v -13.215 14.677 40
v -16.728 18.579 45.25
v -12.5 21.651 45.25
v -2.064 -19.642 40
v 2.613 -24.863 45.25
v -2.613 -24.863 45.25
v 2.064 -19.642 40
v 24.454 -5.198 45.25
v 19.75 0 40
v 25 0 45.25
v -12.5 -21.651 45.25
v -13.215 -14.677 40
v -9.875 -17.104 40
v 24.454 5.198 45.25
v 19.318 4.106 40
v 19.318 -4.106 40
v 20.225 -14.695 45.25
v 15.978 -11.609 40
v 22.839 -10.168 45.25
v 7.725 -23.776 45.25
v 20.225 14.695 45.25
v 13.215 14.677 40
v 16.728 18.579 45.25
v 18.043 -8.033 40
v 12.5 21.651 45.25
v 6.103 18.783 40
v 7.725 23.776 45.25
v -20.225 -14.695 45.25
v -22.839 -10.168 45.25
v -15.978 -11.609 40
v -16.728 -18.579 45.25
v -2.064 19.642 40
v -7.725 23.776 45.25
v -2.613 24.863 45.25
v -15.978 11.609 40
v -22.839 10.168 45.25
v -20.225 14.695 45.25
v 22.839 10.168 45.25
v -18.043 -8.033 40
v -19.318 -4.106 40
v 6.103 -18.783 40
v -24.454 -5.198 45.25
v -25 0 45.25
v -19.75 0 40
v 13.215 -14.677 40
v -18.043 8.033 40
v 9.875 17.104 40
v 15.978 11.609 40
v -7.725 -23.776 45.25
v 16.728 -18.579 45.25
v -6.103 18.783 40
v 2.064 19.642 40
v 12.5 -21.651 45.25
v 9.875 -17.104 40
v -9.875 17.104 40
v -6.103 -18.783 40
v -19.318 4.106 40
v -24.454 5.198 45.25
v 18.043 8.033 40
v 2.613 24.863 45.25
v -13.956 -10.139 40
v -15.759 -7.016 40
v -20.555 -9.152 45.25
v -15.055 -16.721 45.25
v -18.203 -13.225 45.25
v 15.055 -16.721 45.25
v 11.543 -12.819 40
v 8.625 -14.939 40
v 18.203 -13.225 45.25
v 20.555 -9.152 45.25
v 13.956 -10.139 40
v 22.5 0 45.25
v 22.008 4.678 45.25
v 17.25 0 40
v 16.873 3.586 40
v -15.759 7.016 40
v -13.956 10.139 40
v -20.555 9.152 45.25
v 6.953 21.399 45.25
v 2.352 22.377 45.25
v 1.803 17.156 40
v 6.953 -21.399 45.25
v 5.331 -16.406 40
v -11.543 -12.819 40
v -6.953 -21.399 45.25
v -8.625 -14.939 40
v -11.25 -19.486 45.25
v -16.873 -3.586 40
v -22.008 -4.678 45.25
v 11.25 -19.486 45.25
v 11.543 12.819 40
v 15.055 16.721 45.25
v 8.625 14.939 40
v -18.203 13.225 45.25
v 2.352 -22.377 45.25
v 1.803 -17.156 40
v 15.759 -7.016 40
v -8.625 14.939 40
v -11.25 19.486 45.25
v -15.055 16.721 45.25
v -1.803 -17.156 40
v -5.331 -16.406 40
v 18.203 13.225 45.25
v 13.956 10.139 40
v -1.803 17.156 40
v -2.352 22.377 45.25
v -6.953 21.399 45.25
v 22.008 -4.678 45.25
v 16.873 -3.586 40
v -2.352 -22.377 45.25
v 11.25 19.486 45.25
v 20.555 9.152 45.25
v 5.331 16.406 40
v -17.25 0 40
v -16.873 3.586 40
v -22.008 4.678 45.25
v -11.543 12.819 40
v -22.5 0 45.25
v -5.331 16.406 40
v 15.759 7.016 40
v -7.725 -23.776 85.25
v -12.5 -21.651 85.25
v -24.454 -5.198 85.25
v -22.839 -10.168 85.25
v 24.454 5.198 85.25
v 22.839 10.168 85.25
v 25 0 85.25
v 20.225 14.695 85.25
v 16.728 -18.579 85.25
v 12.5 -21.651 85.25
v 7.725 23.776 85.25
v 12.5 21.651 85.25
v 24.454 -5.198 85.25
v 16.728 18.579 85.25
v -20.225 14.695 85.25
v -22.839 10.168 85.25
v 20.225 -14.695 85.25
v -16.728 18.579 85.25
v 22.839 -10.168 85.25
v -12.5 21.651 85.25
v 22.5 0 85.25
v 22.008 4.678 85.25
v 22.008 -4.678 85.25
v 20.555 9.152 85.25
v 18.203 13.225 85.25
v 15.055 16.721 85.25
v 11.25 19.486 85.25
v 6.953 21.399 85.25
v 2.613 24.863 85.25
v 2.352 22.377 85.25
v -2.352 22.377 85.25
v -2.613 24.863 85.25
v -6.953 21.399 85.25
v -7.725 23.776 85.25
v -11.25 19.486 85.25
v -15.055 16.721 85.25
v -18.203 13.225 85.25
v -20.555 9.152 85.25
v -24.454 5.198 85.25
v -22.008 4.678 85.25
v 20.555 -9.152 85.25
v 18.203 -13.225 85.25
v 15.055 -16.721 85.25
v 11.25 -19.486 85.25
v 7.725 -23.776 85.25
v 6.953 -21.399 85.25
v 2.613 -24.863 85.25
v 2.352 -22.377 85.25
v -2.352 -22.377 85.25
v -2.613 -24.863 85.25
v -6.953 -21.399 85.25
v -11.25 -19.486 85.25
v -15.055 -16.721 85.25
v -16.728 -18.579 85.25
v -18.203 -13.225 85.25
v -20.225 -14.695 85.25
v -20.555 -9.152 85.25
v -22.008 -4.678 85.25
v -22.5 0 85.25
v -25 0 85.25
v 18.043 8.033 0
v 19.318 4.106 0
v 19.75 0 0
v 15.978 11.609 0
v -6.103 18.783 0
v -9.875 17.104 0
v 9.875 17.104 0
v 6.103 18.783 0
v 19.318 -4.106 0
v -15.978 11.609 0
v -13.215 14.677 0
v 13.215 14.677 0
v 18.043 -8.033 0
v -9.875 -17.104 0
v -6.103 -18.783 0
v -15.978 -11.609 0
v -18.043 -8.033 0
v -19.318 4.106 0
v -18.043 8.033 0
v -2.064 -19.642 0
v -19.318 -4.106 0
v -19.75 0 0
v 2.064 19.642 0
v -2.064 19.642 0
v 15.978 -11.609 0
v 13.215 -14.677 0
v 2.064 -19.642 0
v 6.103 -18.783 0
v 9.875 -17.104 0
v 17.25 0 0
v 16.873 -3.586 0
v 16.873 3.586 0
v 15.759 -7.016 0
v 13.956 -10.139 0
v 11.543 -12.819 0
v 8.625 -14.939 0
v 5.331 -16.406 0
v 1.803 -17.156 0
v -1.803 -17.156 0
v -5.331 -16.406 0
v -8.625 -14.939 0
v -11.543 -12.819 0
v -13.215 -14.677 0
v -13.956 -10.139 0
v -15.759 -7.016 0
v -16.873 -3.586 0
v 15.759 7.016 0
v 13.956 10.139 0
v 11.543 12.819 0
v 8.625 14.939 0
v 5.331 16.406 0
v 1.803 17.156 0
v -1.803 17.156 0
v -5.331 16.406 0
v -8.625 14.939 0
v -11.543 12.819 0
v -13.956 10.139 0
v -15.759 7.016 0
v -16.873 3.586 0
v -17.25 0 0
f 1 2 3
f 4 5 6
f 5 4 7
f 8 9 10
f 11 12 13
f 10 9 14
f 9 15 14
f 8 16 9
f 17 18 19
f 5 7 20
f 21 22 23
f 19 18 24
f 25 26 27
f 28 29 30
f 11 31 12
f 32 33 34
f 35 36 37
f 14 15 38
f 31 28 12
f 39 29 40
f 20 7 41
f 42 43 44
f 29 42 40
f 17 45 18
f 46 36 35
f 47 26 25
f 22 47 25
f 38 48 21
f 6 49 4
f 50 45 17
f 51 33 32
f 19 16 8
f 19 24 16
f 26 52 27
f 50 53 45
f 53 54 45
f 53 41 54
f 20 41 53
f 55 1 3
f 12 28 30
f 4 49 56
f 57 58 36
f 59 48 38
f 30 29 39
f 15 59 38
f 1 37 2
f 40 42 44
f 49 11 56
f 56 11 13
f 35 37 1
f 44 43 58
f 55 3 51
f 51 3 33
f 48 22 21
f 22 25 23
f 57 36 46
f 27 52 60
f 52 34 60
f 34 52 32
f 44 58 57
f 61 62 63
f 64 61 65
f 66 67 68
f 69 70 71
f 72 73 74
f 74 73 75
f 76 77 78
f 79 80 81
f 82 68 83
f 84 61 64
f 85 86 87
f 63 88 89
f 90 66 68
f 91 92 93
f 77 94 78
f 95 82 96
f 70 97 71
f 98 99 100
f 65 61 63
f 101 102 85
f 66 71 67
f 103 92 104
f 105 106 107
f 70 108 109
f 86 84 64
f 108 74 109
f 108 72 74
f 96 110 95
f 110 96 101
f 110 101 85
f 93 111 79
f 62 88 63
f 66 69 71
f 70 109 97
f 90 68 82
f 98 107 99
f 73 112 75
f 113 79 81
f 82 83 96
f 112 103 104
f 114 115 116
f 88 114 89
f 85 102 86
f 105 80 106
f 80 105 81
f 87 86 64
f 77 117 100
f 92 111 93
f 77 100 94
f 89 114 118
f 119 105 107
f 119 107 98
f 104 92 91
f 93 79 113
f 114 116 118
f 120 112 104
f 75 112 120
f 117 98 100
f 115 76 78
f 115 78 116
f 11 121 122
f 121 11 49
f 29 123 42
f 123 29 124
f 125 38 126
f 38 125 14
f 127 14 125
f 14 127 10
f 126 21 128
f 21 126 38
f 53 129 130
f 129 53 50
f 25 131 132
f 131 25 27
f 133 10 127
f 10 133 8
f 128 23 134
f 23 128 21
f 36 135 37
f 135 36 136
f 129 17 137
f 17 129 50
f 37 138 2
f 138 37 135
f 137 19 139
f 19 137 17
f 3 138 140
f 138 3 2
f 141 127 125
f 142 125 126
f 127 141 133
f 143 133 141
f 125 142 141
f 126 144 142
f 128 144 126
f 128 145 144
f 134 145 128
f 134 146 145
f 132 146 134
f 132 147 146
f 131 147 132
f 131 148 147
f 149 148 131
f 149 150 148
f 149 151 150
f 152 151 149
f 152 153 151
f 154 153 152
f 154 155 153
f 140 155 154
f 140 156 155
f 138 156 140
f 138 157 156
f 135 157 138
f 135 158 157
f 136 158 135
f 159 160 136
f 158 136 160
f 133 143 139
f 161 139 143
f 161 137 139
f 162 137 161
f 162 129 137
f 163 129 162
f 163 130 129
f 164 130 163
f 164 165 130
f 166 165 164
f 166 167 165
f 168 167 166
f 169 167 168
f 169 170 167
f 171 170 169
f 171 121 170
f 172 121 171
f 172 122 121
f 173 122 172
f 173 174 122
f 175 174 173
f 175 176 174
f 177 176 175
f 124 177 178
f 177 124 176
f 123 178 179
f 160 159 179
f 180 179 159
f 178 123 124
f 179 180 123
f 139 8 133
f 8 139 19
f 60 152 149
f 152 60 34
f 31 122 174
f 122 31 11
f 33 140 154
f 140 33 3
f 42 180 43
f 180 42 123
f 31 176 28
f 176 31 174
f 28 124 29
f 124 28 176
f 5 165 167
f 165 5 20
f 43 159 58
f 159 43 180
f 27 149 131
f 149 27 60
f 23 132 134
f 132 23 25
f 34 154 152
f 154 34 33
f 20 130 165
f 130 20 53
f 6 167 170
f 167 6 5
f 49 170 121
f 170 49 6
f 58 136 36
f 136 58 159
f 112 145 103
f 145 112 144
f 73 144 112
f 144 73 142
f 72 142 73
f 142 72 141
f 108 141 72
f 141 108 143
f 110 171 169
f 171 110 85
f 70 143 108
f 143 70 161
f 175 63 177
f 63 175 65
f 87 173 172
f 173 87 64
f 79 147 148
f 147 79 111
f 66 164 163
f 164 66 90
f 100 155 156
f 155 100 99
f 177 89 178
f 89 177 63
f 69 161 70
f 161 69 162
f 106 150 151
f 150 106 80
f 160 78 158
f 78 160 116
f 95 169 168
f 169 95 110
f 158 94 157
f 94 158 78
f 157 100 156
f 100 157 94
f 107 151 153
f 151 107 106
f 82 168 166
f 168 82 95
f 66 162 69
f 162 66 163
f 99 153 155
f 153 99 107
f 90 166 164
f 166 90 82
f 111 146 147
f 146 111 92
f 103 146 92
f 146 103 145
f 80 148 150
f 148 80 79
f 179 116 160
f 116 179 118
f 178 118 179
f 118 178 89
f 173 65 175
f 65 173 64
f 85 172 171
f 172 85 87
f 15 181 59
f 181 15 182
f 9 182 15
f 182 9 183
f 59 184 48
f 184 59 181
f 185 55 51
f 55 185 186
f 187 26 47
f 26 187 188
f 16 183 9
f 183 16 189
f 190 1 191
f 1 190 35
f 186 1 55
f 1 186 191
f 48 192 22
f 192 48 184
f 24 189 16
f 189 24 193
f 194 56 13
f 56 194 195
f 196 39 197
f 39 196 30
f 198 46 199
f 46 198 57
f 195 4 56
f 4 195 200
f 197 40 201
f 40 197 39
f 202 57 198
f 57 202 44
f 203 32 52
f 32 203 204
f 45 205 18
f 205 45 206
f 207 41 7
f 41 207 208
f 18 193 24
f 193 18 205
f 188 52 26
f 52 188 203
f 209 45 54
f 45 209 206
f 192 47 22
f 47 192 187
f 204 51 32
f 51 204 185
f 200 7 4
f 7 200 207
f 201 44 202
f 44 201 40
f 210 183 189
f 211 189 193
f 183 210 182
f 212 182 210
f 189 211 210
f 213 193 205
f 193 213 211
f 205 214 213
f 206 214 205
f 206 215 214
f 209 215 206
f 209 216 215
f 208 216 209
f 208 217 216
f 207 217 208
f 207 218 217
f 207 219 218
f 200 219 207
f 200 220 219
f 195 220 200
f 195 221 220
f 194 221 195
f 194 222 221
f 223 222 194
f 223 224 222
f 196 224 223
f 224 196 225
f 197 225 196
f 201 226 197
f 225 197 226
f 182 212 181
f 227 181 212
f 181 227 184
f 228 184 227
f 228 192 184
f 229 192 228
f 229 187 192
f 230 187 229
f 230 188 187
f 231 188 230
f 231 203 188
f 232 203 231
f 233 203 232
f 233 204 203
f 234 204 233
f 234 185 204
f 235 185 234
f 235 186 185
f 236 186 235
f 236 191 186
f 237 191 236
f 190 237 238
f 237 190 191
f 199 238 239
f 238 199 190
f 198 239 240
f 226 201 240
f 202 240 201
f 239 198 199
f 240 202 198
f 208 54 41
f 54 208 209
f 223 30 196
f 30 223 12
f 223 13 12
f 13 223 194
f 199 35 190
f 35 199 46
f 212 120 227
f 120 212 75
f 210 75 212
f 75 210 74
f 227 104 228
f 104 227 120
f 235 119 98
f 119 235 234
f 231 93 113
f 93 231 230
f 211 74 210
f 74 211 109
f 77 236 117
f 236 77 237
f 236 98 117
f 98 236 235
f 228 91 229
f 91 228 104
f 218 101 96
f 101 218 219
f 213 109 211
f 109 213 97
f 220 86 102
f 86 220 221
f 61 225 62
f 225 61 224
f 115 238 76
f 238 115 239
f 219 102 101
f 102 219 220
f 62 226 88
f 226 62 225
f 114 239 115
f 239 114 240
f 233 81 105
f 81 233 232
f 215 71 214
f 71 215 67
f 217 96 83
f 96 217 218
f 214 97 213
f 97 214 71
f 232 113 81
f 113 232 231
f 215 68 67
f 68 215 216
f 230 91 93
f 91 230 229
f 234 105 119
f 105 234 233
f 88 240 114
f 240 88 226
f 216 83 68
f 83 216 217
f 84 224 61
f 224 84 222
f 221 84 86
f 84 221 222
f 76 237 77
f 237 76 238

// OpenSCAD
// my first parametric OpenSCAD project, making couplers
// for a dust collection vacuum hose
// set the inlet and outlet diameters, use 45 degree slope
// to provide easy no-supports printing
inlet_outer_dia = 50;
inlet_inner_dia = 45;
inlet_length = 40;
outlet_outer_dia = 39.5;
outlet_inner_dia = 34.5;
outlet_length = 40;
max_slope_angle_deg = 45; // stay above 45 degrees for no-supports printing

inlet_outer_radius = inlet_outer_dia / 2.0;
inlet_inner_radius = inlet_inner_dia / 2.0;
outlet_outer_radius = outlet_outer_dia / 2.0;
outlet_inner_radius = outlet_inner_dia / 2.0;
// slope_ratio gives the z distance traveled for a given
// distance change in the x/y directions
max_slope_ratio = tan(max_slope_angle_deg);
inner_length = abs(max_slope_ratio * (inlet_outer_radius - outlet_outer_radius));
outer_length = abs(max_slope_ratio * (inlet_inner_radius - outlet_inner_radius));
cone_length = (inner_length > outer_length)?inner_length:outer_length;

translate([0, 0, outlet_length]) {
    // transition cone
    difference() {
        cylinder(cone_length, outlet_outer_radius, inlet_outer_radius);
        cylinder(cone_length, outlet_inner_radius, inlet_inner_radius);
    }

    // inlet
    translate([0, 0, cone_length]) {
        difference() {
            cylinder(inlet_length, inlet_outer_radius, inlet_outer_radius);
            cylinder(inlet_length, inlet_inner_radius, inlet_inner_radius);
        }
    }


    // outlet
    translate([0, 0, (-1.0 * outlet_length)]) {
        difference() {
            cylinder(outlet_length, outlet_outer_radius, outlet_outer_radius);
            cylinder(outlet_length, outlet_inner_radius, outlet_inner_radius);
        }
    }    
}
